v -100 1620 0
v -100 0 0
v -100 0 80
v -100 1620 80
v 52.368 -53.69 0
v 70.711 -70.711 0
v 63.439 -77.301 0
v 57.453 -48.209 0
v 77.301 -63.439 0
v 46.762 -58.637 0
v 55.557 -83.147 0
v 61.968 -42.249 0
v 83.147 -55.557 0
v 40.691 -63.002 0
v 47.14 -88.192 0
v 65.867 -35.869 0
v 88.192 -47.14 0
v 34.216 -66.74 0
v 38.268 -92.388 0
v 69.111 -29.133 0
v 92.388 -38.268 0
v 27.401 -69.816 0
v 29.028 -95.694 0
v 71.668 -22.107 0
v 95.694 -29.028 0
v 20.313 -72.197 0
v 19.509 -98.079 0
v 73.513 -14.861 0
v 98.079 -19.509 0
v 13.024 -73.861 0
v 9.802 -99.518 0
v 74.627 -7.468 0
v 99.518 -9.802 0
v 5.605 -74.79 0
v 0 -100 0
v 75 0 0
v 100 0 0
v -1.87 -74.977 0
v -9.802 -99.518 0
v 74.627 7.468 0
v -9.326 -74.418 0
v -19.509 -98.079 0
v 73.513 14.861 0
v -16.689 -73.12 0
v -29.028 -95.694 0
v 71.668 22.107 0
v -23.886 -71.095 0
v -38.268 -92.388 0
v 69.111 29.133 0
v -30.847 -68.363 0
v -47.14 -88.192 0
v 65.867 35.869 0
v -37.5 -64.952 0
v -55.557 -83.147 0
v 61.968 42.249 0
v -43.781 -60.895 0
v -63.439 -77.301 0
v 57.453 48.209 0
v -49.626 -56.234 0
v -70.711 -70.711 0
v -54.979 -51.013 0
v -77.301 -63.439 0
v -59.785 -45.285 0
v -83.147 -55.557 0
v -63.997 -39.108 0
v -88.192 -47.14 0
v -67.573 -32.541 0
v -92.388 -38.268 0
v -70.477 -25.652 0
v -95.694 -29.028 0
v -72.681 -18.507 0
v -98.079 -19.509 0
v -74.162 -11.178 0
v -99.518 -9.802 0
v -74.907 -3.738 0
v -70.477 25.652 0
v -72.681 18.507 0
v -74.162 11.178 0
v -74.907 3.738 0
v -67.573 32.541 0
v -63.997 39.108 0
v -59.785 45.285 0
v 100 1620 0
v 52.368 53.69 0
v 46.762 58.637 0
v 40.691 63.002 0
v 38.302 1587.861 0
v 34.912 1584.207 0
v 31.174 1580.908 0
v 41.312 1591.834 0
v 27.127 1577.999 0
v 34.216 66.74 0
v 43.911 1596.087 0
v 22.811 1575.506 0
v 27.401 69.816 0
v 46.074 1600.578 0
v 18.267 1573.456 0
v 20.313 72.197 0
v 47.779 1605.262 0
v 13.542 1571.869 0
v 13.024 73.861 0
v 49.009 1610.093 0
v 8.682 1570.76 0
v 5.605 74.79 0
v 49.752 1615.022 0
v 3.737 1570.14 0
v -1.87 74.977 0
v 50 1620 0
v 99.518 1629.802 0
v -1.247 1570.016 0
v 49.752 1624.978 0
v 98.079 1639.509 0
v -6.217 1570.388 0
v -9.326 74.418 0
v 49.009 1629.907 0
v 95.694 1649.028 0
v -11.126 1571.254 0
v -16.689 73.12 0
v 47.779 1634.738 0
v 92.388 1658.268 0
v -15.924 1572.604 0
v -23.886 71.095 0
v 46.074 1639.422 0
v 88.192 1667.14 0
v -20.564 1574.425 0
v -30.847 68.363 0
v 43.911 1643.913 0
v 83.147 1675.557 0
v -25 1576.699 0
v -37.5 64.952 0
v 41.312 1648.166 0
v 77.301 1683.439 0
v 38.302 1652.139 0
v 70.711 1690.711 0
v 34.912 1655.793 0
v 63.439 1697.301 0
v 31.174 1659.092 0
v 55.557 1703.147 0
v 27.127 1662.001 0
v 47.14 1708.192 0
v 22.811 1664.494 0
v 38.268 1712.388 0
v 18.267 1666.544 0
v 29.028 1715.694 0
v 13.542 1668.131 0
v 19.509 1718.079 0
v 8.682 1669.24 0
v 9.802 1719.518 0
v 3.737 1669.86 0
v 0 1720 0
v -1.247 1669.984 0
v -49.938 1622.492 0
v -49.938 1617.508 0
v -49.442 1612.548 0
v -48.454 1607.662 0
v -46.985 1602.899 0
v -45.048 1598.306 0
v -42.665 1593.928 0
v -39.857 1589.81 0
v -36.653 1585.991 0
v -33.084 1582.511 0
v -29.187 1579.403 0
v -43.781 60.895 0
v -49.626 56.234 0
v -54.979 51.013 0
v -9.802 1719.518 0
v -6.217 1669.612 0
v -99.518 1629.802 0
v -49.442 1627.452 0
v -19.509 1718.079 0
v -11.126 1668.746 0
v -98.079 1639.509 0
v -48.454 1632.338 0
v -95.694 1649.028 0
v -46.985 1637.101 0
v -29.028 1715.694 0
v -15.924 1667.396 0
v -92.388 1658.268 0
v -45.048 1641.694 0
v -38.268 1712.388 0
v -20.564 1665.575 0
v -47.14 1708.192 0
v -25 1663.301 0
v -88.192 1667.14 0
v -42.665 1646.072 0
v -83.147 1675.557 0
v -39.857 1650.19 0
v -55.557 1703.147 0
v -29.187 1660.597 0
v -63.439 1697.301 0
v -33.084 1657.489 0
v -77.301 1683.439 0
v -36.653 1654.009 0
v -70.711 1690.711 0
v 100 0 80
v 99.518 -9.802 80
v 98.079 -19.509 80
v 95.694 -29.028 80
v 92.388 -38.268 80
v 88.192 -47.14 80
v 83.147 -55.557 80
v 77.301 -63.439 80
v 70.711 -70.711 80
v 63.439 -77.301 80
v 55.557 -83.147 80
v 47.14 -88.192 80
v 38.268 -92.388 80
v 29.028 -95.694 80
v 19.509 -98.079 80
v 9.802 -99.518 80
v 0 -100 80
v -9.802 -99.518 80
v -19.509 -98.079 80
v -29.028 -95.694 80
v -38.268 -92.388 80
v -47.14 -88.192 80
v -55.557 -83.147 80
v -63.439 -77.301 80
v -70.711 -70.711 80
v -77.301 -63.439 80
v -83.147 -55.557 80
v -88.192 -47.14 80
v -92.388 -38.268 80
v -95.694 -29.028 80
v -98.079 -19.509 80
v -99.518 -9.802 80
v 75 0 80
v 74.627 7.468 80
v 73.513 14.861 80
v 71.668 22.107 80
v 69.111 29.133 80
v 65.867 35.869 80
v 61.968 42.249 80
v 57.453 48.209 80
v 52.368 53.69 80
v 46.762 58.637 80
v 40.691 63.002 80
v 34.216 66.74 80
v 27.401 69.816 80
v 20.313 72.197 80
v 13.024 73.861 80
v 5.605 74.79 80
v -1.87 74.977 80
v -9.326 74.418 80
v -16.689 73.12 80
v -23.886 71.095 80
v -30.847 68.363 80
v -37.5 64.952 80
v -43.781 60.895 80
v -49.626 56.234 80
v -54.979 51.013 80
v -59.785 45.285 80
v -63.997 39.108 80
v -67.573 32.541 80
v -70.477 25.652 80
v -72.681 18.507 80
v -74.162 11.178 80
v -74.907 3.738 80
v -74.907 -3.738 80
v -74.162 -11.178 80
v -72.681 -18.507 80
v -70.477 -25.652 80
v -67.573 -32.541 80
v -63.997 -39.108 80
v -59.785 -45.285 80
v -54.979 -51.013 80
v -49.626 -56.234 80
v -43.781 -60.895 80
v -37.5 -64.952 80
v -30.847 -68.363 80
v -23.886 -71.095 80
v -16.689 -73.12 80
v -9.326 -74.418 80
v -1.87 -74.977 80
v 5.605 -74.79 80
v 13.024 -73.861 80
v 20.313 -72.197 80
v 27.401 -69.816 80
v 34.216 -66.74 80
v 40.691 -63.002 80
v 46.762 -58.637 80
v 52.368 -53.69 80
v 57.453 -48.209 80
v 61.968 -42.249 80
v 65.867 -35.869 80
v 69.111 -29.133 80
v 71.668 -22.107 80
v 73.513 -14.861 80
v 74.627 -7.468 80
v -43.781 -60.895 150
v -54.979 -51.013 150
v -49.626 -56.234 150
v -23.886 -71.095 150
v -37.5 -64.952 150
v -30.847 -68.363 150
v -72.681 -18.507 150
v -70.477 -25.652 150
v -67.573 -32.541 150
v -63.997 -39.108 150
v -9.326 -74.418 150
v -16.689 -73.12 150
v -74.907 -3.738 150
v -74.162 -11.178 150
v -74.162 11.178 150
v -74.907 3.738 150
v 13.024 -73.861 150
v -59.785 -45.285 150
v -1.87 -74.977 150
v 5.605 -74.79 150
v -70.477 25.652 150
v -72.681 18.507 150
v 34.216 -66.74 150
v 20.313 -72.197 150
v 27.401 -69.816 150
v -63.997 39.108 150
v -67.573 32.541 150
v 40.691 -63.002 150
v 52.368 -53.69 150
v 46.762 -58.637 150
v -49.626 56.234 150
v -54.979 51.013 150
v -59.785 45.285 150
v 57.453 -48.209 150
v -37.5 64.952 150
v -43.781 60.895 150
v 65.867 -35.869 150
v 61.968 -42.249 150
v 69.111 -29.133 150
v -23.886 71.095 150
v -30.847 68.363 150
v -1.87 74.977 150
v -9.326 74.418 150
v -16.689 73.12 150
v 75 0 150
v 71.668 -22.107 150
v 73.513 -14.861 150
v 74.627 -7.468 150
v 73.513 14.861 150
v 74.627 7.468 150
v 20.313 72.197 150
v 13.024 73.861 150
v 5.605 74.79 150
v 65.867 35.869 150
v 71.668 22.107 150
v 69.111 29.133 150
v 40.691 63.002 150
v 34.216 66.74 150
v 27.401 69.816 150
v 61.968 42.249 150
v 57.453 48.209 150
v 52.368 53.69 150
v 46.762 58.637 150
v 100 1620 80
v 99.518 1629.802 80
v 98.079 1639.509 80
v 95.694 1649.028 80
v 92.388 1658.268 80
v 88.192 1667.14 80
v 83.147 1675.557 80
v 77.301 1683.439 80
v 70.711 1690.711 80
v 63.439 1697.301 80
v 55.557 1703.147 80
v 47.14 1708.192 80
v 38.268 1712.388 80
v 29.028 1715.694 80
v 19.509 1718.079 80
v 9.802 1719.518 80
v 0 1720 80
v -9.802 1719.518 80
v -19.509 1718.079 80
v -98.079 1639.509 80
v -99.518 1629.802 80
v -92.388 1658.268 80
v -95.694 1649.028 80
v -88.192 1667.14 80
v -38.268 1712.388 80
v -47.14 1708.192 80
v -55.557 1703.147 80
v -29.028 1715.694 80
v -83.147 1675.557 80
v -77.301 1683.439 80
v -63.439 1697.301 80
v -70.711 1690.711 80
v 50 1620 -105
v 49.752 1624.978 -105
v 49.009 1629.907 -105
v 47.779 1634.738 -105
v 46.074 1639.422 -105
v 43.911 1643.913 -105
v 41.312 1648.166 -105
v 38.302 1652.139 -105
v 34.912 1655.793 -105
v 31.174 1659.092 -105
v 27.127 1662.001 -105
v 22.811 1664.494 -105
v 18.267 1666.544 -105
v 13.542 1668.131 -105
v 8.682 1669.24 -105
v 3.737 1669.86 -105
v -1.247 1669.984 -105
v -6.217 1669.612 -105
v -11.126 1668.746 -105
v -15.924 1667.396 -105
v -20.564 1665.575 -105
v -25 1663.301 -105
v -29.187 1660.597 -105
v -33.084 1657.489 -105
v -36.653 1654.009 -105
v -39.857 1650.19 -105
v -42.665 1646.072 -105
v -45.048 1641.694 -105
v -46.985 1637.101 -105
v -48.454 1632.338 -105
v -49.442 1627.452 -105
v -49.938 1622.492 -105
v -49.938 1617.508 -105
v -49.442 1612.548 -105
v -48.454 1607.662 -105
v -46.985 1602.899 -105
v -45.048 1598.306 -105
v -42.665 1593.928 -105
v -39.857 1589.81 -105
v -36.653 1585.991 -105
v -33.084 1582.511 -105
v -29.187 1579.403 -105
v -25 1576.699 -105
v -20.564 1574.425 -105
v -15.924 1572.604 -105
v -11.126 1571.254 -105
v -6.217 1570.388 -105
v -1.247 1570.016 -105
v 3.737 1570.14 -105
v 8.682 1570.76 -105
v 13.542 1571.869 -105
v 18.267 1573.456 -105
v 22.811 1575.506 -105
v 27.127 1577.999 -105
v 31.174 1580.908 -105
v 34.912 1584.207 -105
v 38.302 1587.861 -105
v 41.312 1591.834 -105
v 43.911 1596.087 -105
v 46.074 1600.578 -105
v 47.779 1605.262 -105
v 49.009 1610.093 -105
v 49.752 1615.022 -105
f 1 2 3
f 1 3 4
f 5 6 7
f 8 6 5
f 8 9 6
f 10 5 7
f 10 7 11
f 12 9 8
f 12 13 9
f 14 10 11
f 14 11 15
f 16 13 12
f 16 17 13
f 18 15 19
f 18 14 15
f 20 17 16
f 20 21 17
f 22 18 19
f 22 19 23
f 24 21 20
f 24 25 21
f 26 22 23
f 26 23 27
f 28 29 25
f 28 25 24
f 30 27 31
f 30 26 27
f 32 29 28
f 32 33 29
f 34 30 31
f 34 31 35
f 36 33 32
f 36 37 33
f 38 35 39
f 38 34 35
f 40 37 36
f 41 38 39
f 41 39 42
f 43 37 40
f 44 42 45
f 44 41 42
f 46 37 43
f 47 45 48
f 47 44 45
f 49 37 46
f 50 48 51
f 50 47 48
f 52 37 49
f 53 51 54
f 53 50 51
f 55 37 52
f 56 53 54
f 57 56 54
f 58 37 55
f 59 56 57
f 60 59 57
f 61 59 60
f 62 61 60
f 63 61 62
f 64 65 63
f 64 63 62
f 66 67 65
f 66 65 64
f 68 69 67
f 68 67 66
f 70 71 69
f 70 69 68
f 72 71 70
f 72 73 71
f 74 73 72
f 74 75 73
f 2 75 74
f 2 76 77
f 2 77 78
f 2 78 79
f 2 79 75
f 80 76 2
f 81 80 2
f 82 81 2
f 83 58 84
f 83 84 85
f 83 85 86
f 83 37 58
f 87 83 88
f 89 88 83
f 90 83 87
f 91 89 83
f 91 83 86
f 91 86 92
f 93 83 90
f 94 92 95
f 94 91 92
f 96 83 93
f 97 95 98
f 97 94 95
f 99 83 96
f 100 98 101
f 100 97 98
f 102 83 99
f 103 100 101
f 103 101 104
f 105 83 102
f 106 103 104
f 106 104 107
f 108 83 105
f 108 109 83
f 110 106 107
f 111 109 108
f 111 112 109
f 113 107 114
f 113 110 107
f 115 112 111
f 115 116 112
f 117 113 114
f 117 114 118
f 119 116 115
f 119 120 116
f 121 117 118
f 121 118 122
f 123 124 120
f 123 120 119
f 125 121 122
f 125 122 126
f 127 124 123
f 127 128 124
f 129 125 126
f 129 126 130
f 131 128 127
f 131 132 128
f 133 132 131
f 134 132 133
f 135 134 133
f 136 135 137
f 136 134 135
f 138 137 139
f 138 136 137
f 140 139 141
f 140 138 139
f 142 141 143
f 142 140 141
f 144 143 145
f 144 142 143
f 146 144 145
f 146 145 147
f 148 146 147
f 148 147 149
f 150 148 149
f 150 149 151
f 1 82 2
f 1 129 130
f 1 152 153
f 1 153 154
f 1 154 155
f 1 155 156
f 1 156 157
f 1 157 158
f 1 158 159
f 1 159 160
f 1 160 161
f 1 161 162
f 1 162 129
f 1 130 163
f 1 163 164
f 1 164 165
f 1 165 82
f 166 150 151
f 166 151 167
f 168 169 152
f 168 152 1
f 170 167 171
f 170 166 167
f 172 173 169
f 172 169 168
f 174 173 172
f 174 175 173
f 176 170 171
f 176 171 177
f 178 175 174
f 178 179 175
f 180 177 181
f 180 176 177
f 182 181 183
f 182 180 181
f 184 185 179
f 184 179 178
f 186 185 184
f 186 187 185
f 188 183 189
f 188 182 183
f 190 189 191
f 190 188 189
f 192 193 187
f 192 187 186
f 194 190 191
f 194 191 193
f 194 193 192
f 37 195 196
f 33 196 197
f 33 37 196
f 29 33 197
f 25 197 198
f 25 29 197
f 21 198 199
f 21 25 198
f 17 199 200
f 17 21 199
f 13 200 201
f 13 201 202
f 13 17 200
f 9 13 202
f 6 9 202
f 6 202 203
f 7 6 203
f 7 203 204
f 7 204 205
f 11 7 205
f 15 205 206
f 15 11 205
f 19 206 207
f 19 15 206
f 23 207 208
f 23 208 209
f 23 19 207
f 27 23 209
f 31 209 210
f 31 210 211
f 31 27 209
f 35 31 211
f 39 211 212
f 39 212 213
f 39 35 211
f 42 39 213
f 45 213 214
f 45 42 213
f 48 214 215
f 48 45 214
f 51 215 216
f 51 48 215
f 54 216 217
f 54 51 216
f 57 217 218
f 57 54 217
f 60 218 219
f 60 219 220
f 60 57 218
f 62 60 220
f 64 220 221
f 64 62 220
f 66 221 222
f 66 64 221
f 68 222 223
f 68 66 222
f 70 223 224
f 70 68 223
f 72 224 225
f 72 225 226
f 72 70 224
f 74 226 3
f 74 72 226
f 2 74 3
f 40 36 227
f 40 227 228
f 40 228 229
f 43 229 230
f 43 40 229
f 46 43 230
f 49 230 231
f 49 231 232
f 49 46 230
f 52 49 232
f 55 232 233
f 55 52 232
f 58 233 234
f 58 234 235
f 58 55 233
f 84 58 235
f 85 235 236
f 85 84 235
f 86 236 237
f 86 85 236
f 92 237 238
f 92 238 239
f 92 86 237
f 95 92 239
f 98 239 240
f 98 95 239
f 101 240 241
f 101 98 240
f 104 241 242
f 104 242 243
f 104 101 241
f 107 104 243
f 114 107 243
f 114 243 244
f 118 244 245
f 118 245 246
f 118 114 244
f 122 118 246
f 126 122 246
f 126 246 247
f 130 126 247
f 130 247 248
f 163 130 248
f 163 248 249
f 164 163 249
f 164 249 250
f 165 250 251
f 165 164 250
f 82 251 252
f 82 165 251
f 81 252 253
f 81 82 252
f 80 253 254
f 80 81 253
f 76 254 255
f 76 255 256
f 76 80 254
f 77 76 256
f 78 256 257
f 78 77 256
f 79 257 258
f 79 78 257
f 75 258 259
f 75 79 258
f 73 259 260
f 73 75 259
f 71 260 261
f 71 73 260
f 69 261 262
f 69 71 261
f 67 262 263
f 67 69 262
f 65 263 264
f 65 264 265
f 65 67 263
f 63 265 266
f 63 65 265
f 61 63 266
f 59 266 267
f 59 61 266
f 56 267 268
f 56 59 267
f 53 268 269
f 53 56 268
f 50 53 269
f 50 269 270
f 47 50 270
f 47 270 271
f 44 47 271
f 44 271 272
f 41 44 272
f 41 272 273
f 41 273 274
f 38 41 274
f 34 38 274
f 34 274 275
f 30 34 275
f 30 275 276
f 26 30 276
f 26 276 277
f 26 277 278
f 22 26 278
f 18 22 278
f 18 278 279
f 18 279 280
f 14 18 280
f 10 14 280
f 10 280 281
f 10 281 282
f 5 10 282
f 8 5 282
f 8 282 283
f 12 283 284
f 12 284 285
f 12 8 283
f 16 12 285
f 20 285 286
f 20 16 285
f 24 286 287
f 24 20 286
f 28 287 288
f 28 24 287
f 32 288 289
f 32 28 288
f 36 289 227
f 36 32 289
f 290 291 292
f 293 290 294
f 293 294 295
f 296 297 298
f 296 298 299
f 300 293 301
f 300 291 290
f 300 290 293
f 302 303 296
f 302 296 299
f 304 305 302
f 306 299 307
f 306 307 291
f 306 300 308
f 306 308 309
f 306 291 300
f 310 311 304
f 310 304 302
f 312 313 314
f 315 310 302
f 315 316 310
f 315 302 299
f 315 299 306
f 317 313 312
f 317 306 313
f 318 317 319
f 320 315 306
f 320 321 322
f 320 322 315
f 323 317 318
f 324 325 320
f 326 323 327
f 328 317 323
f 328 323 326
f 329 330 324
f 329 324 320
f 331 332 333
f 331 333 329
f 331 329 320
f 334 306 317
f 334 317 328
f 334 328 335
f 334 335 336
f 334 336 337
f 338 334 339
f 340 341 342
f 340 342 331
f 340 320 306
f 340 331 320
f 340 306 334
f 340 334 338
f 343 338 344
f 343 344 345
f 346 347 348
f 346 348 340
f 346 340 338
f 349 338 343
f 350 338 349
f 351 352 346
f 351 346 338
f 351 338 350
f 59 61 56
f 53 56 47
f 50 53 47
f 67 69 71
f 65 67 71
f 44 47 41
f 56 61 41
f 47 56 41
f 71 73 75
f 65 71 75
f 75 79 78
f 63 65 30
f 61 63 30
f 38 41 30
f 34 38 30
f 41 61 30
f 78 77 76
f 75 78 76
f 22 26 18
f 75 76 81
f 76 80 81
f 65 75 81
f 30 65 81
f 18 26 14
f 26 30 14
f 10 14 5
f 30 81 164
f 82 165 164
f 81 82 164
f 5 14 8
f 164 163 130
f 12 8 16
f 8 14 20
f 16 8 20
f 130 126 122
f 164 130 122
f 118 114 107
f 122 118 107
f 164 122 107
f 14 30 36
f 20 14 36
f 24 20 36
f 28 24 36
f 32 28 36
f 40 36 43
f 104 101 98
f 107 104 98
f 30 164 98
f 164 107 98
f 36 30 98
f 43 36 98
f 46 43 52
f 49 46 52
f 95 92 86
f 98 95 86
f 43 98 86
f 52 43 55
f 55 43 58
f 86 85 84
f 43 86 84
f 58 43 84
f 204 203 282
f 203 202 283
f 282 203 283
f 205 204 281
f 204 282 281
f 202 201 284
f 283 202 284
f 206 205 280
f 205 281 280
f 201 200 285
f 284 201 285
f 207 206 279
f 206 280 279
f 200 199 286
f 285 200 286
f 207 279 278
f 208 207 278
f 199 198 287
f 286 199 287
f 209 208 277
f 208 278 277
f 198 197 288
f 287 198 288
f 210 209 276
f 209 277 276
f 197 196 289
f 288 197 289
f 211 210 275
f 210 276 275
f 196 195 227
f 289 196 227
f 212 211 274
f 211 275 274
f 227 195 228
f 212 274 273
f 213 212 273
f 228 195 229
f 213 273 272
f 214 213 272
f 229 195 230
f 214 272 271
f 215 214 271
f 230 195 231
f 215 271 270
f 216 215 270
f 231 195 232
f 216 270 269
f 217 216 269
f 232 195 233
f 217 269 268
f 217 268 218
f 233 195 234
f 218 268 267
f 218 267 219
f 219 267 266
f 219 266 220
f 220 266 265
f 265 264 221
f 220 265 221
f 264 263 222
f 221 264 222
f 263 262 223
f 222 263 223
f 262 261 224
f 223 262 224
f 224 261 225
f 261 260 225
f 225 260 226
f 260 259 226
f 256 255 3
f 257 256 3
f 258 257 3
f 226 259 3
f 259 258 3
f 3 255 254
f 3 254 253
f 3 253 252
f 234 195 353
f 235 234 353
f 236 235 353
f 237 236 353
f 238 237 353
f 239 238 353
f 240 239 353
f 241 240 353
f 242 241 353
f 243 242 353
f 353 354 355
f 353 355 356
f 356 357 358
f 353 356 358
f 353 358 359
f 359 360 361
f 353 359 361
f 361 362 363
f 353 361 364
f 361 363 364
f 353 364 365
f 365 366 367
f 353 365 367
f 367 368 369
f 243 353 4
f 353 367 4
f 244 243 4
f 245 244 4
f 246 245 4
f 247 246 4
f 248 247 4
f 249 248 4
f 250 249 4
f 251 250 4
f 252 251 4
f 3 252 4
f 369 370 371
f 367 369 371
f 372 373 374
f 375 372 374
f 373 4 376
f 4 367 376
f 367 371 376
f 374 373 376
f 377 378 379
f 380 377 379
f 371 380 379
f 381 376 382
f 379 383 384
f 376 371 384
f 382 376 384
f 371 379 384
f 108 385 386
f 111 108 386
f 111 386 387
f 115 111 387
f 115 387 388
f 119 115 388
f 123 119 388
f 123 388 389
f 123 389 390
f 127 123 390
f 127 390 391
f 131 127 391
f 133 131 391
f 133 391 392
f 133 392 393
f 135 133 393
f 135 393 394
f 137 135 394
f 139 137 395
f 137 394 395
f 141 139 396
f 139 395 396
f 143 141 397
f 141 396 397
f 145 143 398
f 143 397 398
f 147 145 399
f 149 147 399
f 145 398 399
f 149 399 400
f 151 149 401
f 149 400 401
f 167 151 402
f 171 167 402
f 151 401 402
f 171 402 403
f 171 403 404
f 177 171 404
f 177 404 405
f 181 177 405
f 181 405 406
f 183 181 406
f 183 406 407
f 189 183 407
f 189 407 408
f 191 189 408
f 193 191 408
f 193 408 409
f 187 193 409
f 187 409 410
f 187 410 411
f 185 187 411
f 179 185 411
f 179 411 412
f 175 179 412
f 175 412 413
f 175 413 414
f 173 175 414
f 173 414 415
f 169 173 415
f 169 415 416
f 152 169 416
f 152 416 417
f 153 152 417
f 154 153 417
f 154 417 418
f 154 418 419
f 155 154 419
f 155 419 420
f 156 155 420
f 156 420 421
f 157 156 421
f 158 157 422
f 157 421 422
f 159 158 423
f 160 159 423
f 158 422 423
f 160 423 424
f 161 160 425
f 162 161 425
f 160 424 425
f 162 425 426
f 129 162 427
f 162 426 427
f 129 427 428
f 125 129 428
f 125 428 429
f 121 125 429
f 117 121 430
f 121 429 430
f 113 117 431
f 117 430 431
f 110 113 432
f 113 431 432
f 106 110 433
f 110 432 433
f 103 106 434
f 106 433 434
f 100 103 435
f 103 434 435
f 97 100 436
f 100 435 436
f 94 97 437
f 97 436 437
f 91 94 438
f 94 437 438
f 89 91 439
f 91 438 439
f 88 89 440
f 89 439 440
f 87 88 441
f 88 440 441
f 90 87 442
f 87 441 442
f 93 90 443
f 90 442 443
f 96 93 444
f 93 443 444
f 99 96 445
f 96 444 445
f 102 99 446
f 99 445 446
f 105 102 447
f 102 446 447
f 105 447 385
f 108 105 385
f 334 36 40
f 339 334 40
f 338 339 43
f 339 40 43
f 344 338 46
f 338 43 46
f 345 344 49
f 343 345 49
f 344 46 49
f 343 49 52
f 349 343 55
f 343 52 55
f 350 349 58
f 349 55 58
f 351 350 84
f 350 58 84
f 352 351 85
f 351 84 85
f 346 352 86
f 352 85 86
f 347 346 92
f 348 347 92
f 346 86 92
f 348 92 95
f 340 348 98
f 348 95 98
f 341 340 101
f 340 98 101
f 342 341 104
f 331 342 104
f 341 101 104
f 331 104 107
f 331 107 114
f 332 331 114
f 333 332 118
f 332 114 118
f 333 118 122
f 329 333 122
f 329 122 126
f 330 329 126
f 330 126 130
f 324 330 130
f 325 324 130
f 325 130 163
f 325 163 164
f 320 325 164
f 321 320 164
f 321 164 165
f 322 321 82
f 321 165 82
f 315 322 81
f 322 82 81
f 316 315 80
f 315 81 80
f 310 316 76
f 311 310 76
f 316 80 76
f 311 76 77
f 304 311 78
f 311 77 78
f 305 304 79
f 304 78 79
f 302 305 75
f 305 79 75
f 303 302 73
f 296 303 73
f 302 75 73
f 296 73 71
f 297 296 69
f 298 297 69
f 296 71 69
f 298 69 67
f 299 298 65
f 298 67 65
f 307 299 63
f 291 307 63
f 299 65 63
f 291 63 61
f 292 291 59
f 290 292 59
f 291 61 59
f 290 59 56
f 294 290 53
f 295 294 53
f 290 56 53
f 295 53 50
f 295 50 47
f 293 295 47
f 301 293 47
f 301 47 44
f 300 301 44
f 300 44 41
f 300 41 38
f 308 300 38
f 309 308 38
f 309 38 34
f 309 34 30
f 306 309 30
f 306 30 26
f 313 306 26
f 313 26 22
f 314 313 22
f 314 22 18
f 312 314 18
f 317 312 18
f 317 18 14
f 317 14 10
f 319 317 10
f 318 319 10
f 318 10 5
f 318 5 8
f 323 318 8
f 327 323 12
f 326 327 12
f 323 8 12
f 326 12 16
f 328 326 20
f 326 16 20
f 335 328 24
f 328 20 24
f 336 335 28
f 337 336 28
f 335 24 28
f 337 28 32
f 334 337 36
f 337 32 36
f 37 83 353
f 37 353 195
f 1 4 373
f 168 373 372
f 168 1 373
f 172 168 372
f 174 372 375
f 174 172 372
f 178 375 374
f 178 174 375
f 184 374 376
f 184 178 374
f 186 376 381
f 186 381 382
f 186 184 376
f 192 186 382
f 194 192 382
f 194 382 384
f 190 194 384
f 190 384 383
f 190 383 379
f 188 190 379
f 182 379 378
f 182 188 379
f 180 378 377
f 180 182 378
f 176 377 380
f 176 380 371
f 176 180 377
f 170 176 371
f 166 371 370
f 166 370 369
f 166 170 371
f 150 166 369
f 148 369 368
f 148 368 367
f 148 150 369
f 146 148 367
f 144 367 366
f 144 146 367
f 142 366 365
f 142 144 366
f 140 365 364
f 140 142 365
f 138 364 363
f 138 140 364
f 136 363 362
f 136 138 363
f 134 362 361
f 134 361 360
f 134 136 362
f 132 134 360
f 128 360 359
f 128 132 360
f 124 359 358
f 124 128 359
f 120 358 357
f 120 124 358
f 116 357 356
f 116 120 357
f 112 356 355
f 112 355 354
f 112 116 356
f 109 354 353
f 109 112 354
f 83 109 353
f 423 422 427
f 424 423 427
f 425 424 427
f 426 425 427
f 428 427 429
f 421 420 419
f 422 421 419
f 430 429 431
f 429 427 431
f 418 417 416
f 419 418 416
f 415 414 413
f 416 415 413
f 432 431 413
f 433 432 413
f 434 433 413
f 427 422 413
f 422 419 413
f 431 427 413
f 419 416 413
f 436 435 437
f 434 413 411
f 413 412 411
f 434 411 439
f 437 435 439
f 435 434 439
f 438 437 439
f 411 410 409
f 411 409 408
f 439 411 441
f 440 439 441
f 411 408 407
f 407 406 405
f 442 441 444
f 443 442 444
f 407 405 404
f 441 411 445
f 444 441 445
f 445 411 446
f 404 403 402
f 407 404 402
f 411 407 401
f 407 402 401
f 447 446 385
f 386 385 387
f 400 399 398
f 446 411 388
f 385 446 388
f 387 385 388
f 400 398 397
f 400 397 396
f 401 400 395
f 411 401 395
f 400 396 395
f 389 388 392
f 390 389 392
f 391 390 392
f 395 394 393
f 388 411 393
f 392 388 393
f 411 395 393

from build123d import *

# Parameters (mm, degrees)
SKETCH1_R           = 50
SKETCH1_R_2         = 75
BOSS_EXTRUDE1_DEPTH = 80
SKETCH1_2_R         = 75
BOSS_EXTRUDE2_DEPTH = 150
BOSS_EXTRUDE3_START = -105
SKETCH1_4_R         = 50
BOSS_EXTRUDE3_DEPTH = 185


with BuildPart() as part:
    # Sketch1 → Boss-Extrude1 (new body)
    with BuildSketch(Plane.XY):
        with BuildLine():
            Line((-100, 0), (-100, 1620))
            ThreePointArc((-100, 1620), (0, 1720), (100, 1620))
            Line((100, 1620), (100, 0))
            ThreePointArc((100, 0), (0, -100), (-100, 0))
        make_face()
        with Locations((0, 1620)):
            Circle(SKETCH1_R, mode=Mode.SUBTRACT)
        Circle(SKETCH1_R_2, mode=Mode.SUBTRACT)
    extrude(amount=BOSS_EXTRUDE1_DEPTH)

    # Sketch1<4> → Boss-Extrude3 (add)
    with BuildSketch(Plane.XY.offset(BOSS_EXTRUDE3_START)):
        with Locations((0, 1620)):
            Circle(SKETCH1_4_R)
    extrude(amount=BOSS_EXTRUDE3_DEPTH)


with BuildPart() as body_2:
    # Sketch1<2> → Boss-Extrude2 (new body)
    with BuildSketch(Plane.XY):
        Circle(SKETCH1_2_R)
    extrude(amount=BOSS_EXTRUDE2_DEPTH)


solid = Compound([part.part, body_2.part])
